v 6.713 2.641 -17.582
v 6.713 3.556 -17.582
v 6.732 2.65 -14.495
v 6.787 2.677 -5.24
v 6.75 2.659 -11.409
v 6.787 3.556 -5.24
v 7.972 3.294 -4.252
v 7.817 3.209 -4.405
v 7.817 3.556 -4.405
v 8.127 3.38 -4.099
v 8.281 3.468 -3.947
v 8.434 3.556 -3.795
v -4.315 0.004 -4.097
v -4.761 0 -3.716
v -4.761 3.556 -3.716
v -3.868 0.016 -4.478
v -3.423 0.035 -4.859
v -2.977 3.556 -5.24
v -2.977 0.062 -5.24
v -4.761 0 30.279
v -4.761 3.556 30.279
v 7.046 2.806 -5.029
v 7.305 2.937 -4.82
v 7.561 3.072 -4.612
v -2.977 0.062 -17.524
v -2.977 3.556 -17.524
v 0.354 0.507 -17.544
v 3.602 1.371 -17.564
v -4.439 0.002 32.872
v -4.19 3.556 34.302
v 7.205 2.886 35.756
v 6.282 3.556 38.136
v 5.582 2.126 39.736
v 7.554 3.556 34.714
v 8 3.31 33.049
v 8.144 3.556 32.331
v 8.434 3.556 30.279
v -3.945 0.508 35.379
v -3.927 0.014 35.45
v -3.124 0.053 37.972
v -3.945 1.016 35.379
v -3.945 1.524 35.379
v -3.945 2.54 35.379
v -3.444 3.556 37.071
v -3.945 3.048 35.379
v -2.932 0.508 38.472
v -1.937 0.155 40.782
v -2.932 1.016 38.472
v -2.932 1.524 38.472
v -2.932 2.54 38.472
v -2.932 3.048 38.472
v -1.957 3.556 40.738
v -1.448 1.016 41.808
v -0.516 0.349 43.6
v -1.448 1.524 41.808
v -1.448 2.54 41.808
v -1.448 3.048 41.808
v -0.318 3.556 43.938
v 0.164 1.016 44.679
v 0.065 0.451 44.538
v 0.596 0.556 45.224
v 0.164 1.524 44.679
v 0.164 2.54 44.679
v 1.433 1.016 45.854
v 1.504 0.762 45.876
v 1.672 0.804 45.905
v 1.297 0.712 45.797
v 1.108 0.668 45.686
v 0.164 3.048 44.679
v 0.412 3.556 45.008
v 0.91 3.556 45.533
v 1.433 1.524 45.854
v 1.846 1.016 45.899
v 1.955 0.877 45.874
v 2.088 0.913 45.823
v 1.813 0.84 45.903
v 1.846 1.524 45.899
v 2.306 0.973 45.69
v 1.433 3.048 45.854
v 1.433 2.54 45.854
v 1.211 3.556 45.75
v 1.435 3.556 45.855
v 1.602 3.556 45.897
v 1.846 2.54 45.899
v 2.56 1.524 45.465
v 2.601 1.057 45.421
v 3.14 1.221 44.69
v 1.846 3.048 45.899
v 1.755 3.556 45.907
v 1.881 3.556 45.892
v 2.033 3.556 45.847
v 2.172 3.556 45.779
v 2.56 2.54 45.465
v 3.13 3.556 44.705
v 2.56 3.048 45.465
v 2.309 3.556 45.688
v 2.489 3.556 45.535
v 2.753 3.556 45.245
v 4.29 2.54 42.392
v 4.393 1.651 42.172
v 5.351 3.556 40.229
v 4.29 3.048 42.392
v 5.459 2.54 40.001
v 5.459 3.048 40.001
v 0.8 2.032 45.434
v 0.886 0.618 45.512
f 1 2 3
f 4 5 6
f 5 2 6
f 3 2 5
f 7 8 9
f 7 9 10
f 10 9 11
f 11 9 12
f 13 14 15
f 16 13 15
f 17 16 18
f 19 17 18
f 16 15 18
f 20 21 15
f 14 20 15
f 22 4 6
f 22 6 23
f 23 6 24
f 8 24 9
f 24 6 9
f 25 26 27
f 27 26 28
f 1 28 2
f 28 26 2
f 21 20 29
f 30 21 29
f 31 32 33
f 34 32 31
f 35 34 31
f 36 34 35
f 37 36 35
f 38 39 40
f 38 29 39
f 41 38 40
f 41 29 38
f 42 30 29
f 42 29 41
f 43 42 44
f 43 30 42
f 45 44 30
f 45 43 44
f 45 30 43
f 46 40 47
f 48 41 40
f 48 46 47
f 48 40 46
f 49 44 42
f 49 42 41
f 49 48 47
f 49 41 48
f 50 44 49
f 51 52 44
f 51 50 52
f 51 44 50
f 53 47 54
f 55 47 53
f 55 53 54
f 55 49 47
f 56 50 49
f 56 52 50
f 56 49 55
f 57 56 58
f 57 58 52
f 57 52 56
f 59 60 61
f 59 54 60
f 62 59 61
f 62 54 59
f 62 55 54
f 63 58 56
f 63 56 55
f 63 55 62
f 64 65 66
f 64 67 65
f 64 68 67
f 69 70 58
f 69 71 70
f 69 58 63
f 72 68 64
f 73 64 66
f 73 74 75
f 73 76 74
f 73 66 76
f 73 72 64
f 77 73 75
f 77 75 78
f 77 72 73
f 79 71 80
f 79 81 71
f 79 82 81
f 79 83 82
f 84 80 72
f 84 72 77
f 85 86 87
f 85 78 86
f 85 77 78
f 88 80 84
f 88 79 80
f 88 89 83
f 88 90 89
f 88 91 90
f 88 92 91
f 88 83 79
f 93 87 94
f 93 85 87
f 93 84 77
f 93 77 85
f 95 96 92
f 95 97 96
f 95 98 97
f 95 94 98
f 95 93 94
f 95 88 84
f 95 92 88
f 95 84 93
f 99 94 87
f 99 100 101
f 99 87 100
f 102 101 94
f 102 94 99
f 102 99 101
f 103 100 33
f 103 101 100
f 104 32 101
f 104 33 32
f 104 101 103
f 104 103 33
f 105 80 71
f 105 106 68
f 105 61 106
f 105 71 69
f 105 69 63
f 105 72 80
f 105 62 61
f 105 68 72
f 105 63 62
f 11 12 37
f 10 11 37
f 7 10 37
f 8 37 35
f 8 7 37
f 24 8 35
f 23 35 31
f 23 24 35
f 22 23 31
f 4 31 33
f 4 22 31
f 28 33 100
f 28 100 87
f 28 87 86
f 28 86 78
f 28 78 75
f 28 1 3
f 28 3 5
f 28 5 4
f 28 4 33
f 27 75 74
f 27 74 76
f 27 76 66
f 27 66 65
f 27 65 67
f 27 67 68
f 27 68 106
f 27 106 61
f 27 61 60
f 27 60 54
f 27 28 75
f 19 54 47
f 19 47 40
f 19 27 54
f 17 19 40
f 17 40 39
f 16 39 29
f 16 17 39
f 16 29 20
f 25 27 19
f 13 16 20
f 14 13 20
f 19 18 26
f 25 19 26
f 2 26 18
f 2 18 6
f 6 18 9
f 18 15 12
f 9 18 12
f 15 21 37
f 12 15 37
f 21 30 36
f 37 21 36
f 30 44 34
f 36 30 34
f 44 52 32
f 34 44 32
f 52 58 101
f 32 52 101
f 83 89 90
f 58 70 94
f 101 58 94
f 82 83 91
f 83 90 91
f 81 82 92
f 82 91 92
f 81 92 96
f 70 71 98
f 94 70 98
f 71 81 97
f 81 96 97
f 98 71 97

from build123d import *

# Parameters (mm, degrees)
F2_DEPTH    = 3.556
F3_T1_DEPTH = 100.1960824302


# Not quite as in the source:
# - a fillet or chamfer that OpenCascade refuses, or shapes differently, is made with other operations: its cross-section is extruded or revolved along the edge and cut away or added


with BuildPart() as f2:
    # F1 (on offset) → F2 (new body)
    with BuildSketch(Plane.XZ.offset(-3.556)):
        with BuildLine():
            Line((-4.7608385794, 30.2790850401), (-4.7608385794, -3.7161211949))
            Line((-4.7608385794, -3.7161211949), (-2.9770701658, -5.2399407141))
            Line((-2.9770701658, -5.2399407141), (-2.9770701658, -17.5244603306))
            Line((-2.9770701658, -17.5244603306), (6.7130425275, -17.5824380662))
            Line((6.7130425275, -17.5824380662), (6.7868899709, -5.2399407141))
            Line((6.7868899709, -5.2399407141), (7.8166099265, -4.4050700963))
            Line((7.8166099265, -4.4050700963), (8.4343710914, -3.7950705737))
            Line((8.4343710914, -3.7950705737), (8.4343710914, 30.2790850401))
            add(Edge.make_bspline(
                [(-4.7608385794, 30.2790850401), (-4.5736827726, 31.9597863049), (-4.1702659217, 35.5825604162), (-1.8450394854, 41.296641728), (1.8526726795, 48.0701768841), (4.4004372394, 42.0002992607), (5.4469394771, 40.1971389087), (7.9610301665, 34.2093633894), (8.287935143, 31.4949825195), (8.4343710914, 30.2790850401)],
                knots=[0, 0, 0, 0, 0.1477315981, 0.3184374406, 0.4674111086, 0.6017993168, 0.7078404462, 0.869128143, 1, 1, 1, 1], degree=3))
        make_face()
    extrude(amount=F2_DEPTH)

    # F3: fillet of radius 26.3680405282 on 1 edges, made by hand

    # F3_s2 → F3_t1 (cut)
    with BuildSketch(Plane.XY.offset(-36.8560339819)):
        with BuildLine():
            ThreePointArc((8.4343710914, 3.556), (2.057056347, 0.904513961), (-4.7900142719, 0))
            Line((-4.7900142719, 0), (-4.7900142719, -0.5273608106))
            Line((-4.7900142719, -0.5273608106), (8.4343710914, -0.5273608106))
            Line((8.4343710914, -0.5273608106), (8.961731902, 0))
            ThreePointArc((8.961731902, 0), (8.961731902, 1.778), (8.6988587987, 3.0997591894))
            Line((8.6988587987, 3.0997591894), (8.4343710914, 3.556))
        make_face()
    extrude(amount=F3_T1_DEPTH, mode=Mode.SUBTRACT)


solid = f2.part
